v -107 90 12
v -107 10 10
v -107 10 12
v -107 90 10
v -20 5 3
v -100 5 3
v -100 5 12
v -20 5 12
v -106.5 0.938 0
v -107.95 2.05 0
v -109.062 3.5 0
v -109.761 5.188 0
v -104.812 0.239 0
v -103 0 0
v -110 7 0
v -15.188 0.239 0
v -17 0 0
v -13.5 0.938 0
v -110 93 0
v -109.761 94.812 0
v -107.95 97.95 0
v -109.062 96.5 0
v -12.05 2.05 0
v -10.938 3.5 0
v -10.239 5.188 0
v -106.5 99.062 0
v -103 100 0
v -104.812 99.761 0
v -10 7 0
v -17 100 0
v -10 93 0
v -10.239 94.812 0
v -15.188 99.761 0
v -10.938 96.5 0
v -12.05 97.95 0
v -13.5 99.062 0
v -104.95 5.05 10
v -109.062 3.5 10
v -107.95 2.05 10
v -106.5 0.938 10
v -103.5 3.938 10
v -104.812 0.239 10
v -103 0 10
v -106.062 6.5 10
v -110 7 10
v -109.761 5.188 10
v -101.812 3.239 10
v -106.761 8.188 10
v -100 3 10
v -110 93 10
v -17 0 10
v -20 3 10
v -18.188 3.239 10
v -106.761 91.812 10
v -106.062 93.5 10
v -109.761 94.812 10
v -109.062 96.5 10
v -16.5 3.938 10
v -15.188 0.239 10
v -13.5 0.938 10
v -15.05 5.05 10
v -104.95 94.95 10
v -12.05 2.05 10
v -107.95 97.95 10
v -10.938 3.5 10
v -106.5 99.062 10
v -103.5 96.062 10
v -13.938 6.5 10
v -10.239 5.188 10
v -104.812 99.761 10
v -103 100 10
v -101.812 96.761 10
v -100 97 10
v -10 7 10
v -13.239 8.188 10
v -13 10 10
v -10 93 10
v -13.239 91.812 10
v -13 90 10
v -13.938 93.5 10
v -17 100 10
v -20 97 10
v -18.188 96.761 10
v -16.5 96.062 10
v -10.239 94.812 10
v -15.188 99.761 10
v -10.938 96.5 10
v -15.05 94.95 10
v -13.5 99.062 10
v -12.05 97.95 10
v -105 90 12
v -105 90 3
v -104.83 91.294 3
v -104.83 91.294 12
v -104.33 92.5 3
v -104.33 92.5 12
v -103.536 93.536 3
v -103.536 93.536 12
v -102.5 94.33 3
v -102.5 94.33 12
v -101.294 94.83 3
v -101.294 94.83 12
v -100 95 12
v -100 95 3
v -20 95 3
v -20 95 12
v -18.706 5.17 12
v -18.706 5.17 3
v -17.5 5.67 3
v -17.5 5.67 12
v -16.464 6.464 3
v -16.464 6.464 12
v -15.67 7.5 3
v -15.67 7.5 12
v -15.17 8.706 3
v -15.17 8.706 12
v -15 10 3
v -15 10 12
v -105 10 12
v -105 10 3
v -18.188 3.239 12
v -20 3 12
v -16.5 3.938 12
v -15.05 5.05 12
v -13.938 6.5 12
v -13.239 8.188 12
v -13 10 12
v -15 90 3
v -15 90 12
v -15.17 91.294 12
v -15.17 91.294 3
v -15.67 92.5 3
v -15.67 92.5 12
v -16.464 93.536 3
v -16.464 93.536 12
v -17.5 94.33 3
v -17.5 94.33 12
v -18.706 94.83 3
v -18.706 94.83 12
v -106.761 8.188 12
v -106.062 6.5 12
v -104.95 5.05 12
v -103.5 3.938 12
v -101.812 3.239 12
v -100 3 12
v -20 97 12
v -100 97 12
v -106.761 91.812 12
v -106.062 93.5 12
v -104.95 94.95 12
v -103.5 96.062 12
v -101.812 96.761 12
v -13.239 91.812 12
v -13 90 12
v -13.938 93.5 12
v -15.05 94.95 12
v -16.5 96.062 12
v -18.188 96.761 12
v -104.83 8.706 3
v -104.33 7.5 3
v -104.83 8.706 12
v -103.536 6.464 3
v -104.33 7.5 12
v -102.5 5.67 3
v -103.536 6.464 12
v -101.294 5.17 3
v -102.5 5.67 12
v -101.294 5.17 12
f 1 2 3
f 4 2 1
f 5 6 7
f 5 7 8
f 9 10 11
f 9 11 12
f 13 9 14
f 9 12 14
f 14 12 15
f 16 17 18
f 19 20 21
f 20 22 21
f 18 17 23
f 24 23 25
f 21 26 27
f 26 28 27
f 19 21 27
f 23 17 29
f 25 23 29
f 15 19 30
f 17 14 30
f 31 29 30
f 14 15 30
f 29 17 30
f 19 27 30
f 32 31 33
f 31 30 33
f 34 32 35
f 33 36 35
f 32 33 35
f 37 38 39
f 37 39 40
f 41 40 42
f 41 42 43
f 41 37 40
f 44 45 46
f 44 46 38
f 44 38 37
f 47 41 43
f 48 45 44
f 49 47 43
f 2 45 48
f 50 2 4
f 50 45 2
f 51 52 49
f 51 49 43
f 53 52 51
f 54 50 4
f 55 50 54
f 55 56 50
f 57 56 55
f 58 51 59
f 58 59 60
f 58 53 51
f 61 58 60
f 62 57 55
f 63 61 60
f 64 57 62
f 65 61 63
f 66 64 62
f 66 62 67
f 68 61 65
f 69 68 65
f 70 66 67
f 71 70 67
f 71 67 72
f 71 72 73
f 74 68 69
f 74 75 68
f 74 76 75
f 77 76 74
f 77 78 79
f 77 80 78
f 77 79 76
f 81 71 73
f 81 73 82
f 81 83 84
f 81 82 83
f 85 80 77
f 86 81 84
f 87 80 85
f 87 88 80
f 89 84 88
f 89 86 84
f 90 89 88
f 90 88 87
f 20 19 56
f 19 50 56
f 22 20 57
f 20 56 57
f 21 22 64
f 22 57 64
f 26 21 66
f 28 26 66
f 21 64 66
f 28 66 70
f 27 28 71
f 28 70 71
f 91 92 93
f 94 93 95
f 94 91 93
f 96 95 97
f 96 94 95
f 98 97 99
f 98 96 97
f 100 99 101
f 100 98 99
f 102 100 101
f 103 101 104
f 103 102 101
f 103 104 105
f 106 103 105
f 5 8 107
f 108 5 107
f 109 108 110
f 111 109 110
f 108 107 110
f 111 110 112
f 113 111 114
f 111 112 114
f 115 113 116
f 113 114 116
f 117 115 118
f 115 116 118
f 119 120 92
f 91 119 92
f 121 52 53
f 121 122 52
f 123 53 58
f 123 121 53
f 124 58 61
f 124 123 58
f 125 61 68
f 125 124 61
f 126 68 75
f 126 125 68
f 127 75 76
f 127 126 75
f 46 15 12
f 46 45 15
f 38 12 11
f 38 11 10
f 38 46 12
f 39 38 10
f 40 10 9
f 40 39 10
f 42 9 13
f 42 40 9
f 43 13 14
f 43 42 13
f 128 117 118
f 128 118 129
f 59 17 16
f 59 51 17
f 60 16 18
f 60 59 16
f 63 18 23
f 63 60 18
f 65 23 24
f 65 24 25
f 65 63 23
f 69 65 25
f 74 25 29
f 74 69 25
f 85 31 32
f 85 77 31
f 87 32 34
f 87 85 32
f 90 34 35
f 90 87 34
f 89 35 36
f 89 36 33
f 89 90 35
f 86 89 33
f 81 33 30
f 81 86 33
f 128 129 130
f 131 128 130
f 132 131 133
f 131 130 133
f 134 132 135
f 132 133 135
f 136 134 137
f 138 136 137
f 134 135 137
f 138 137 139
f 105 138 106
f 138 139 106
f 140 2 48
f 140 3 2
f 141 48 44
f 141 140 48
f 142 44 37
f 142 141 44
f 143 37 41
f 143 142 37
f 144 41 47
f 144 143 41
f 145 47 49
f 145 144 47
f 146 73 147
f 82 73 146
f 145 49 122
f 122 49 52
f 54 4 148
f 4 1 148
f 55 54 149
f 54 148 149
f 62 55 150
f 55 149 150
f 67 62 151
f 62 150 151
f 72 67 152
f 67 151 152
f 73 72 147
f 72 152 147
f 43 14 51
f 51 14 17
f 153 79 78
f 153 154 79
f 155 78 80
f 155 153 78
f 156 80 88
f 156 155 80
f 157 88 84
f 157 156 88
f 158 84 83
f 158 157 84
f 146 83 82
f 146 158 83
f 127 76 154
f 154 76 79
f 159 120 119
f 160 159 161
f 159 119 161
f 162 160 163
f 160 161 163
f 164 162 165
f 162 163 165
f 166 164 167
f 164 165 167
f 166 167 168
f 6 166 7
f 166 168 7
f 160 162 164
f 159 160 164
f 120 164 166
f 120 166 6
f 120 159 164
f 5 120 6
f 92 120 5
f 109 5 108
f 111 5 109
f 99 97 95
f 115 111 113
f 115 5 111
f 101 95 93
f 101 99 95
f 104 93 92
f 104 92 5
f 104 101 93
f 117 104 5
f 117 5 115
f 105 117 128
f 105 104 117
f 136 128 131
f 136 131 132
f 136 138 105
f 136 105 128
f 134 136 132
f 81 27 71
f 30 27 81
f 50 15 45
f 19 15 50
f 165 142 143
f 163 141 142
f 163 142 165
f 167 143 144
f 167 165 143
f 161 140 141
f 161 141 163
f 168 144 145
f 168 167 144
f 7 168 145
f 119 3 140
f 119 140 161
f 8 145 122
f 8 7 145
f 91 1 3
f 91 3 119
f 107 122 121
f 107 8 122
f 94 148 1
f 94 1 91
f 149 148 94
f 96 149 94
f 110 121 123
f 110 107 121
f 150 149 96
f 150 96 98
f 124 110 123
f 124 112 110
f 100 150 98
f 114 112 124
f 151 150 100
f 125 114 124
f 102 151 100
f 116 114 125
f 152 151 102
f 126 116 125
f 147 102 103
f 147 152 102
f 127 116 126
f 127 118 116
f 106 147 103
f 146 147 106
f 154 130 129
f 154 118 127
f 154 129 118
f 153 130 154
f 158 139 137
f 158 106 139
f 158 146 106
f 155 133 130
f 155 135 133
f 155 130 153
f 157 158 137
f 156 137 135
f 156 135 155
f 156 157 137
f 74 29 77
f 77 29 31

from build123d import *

# Parameters (mm, degrees)
BOX006_W     = 90
BOX006_H     = 90
BOX006_DEPTH = 10
FILLET008_R  = 5
BOX007_W     = 100
BOX007_H     = 100
BOX007_DEPTH = 10
FILLET007_R  = 7
BOX008_W     = 94
BOX008_H     = 94
BOX008_DEPTH = 2
FILLET006_R  = 7


with BuildPart() as fillet008:
    # Box006 → Box006 (new body)
    with BuildSketch(Plane(origin=(5, 5, 3), x_dir=(1, 0, 0), z_dir=(0, 0, 1))):
        with Locations((45, 45)):
            Rectangle(BOX006_W, BOX006_H)
    extrude(amount=BOX006_DEPTH)

    # Fillet008
    fillet008_edges = [fillet008.edges().sort_by_distance(p)[0] for p in [
        (5, 5, 8),
        (5, 95, 8),
        (95, 5, 8),
        (95, 95, 8),
    ]]
    fillet(fillet008_edges, radius=FILLET008_R)


with BuildPart() as body_with_fillets003:
    # Box007 → Box007 (new body)
    with BuildSketch(Plane.XY):
        with Locations((50, 50)):
            Rectangle(BOX007_W, BOX007_H)
    extrude(amount=BOX007_DEPTH)

    # Fillet007
    fillet007_edges = [body_with_fillets003.edges().sort_by_distance(p)[0] for p in [
        (0, 0, 5),
        (0, 100, 5),
        (100, 0, 5),
        (100, 100, 5),
    ]]
    fillet(fillet007_edges, radius=FILLET007_R)


with BuildPart() as wet_palette:
    # Box008 → Box008 (new body)
    with BuildSketch(Plane(origin=(3, 3, 10), x_dir=(1, 0, 0), z_dir=(0, 0, 1))):
        with Locations((47, 47)):
            Rectangle(BOX008_W, BOX008_H)
    extrude(amount=BOX008_DEPTH)

    # Fillet006
    fillet006_edges = [wet_palette.edges().sort_by_distance(p)[0] for p in [
        (3, 3, 11),
        (3, 97, 11),
        (97, 3, 11),
        (97, 97, 11),
    ]]
    fillet(fillet006_edges, radius=FILLET006_R)

    # Fusion003: union Body with fillets003
    add(body_with_fillets003.part)

    # Cut002: cut Fillet008
    add(fillet008.part, mode=Mode.SUBTRACT)


with BuildPart() as wet_palette_1:
    # Cut002 placement: moved
    add(wet_palette.part.moved(Location((-110, 0, 0))))


solid = wet_palette_1.part
